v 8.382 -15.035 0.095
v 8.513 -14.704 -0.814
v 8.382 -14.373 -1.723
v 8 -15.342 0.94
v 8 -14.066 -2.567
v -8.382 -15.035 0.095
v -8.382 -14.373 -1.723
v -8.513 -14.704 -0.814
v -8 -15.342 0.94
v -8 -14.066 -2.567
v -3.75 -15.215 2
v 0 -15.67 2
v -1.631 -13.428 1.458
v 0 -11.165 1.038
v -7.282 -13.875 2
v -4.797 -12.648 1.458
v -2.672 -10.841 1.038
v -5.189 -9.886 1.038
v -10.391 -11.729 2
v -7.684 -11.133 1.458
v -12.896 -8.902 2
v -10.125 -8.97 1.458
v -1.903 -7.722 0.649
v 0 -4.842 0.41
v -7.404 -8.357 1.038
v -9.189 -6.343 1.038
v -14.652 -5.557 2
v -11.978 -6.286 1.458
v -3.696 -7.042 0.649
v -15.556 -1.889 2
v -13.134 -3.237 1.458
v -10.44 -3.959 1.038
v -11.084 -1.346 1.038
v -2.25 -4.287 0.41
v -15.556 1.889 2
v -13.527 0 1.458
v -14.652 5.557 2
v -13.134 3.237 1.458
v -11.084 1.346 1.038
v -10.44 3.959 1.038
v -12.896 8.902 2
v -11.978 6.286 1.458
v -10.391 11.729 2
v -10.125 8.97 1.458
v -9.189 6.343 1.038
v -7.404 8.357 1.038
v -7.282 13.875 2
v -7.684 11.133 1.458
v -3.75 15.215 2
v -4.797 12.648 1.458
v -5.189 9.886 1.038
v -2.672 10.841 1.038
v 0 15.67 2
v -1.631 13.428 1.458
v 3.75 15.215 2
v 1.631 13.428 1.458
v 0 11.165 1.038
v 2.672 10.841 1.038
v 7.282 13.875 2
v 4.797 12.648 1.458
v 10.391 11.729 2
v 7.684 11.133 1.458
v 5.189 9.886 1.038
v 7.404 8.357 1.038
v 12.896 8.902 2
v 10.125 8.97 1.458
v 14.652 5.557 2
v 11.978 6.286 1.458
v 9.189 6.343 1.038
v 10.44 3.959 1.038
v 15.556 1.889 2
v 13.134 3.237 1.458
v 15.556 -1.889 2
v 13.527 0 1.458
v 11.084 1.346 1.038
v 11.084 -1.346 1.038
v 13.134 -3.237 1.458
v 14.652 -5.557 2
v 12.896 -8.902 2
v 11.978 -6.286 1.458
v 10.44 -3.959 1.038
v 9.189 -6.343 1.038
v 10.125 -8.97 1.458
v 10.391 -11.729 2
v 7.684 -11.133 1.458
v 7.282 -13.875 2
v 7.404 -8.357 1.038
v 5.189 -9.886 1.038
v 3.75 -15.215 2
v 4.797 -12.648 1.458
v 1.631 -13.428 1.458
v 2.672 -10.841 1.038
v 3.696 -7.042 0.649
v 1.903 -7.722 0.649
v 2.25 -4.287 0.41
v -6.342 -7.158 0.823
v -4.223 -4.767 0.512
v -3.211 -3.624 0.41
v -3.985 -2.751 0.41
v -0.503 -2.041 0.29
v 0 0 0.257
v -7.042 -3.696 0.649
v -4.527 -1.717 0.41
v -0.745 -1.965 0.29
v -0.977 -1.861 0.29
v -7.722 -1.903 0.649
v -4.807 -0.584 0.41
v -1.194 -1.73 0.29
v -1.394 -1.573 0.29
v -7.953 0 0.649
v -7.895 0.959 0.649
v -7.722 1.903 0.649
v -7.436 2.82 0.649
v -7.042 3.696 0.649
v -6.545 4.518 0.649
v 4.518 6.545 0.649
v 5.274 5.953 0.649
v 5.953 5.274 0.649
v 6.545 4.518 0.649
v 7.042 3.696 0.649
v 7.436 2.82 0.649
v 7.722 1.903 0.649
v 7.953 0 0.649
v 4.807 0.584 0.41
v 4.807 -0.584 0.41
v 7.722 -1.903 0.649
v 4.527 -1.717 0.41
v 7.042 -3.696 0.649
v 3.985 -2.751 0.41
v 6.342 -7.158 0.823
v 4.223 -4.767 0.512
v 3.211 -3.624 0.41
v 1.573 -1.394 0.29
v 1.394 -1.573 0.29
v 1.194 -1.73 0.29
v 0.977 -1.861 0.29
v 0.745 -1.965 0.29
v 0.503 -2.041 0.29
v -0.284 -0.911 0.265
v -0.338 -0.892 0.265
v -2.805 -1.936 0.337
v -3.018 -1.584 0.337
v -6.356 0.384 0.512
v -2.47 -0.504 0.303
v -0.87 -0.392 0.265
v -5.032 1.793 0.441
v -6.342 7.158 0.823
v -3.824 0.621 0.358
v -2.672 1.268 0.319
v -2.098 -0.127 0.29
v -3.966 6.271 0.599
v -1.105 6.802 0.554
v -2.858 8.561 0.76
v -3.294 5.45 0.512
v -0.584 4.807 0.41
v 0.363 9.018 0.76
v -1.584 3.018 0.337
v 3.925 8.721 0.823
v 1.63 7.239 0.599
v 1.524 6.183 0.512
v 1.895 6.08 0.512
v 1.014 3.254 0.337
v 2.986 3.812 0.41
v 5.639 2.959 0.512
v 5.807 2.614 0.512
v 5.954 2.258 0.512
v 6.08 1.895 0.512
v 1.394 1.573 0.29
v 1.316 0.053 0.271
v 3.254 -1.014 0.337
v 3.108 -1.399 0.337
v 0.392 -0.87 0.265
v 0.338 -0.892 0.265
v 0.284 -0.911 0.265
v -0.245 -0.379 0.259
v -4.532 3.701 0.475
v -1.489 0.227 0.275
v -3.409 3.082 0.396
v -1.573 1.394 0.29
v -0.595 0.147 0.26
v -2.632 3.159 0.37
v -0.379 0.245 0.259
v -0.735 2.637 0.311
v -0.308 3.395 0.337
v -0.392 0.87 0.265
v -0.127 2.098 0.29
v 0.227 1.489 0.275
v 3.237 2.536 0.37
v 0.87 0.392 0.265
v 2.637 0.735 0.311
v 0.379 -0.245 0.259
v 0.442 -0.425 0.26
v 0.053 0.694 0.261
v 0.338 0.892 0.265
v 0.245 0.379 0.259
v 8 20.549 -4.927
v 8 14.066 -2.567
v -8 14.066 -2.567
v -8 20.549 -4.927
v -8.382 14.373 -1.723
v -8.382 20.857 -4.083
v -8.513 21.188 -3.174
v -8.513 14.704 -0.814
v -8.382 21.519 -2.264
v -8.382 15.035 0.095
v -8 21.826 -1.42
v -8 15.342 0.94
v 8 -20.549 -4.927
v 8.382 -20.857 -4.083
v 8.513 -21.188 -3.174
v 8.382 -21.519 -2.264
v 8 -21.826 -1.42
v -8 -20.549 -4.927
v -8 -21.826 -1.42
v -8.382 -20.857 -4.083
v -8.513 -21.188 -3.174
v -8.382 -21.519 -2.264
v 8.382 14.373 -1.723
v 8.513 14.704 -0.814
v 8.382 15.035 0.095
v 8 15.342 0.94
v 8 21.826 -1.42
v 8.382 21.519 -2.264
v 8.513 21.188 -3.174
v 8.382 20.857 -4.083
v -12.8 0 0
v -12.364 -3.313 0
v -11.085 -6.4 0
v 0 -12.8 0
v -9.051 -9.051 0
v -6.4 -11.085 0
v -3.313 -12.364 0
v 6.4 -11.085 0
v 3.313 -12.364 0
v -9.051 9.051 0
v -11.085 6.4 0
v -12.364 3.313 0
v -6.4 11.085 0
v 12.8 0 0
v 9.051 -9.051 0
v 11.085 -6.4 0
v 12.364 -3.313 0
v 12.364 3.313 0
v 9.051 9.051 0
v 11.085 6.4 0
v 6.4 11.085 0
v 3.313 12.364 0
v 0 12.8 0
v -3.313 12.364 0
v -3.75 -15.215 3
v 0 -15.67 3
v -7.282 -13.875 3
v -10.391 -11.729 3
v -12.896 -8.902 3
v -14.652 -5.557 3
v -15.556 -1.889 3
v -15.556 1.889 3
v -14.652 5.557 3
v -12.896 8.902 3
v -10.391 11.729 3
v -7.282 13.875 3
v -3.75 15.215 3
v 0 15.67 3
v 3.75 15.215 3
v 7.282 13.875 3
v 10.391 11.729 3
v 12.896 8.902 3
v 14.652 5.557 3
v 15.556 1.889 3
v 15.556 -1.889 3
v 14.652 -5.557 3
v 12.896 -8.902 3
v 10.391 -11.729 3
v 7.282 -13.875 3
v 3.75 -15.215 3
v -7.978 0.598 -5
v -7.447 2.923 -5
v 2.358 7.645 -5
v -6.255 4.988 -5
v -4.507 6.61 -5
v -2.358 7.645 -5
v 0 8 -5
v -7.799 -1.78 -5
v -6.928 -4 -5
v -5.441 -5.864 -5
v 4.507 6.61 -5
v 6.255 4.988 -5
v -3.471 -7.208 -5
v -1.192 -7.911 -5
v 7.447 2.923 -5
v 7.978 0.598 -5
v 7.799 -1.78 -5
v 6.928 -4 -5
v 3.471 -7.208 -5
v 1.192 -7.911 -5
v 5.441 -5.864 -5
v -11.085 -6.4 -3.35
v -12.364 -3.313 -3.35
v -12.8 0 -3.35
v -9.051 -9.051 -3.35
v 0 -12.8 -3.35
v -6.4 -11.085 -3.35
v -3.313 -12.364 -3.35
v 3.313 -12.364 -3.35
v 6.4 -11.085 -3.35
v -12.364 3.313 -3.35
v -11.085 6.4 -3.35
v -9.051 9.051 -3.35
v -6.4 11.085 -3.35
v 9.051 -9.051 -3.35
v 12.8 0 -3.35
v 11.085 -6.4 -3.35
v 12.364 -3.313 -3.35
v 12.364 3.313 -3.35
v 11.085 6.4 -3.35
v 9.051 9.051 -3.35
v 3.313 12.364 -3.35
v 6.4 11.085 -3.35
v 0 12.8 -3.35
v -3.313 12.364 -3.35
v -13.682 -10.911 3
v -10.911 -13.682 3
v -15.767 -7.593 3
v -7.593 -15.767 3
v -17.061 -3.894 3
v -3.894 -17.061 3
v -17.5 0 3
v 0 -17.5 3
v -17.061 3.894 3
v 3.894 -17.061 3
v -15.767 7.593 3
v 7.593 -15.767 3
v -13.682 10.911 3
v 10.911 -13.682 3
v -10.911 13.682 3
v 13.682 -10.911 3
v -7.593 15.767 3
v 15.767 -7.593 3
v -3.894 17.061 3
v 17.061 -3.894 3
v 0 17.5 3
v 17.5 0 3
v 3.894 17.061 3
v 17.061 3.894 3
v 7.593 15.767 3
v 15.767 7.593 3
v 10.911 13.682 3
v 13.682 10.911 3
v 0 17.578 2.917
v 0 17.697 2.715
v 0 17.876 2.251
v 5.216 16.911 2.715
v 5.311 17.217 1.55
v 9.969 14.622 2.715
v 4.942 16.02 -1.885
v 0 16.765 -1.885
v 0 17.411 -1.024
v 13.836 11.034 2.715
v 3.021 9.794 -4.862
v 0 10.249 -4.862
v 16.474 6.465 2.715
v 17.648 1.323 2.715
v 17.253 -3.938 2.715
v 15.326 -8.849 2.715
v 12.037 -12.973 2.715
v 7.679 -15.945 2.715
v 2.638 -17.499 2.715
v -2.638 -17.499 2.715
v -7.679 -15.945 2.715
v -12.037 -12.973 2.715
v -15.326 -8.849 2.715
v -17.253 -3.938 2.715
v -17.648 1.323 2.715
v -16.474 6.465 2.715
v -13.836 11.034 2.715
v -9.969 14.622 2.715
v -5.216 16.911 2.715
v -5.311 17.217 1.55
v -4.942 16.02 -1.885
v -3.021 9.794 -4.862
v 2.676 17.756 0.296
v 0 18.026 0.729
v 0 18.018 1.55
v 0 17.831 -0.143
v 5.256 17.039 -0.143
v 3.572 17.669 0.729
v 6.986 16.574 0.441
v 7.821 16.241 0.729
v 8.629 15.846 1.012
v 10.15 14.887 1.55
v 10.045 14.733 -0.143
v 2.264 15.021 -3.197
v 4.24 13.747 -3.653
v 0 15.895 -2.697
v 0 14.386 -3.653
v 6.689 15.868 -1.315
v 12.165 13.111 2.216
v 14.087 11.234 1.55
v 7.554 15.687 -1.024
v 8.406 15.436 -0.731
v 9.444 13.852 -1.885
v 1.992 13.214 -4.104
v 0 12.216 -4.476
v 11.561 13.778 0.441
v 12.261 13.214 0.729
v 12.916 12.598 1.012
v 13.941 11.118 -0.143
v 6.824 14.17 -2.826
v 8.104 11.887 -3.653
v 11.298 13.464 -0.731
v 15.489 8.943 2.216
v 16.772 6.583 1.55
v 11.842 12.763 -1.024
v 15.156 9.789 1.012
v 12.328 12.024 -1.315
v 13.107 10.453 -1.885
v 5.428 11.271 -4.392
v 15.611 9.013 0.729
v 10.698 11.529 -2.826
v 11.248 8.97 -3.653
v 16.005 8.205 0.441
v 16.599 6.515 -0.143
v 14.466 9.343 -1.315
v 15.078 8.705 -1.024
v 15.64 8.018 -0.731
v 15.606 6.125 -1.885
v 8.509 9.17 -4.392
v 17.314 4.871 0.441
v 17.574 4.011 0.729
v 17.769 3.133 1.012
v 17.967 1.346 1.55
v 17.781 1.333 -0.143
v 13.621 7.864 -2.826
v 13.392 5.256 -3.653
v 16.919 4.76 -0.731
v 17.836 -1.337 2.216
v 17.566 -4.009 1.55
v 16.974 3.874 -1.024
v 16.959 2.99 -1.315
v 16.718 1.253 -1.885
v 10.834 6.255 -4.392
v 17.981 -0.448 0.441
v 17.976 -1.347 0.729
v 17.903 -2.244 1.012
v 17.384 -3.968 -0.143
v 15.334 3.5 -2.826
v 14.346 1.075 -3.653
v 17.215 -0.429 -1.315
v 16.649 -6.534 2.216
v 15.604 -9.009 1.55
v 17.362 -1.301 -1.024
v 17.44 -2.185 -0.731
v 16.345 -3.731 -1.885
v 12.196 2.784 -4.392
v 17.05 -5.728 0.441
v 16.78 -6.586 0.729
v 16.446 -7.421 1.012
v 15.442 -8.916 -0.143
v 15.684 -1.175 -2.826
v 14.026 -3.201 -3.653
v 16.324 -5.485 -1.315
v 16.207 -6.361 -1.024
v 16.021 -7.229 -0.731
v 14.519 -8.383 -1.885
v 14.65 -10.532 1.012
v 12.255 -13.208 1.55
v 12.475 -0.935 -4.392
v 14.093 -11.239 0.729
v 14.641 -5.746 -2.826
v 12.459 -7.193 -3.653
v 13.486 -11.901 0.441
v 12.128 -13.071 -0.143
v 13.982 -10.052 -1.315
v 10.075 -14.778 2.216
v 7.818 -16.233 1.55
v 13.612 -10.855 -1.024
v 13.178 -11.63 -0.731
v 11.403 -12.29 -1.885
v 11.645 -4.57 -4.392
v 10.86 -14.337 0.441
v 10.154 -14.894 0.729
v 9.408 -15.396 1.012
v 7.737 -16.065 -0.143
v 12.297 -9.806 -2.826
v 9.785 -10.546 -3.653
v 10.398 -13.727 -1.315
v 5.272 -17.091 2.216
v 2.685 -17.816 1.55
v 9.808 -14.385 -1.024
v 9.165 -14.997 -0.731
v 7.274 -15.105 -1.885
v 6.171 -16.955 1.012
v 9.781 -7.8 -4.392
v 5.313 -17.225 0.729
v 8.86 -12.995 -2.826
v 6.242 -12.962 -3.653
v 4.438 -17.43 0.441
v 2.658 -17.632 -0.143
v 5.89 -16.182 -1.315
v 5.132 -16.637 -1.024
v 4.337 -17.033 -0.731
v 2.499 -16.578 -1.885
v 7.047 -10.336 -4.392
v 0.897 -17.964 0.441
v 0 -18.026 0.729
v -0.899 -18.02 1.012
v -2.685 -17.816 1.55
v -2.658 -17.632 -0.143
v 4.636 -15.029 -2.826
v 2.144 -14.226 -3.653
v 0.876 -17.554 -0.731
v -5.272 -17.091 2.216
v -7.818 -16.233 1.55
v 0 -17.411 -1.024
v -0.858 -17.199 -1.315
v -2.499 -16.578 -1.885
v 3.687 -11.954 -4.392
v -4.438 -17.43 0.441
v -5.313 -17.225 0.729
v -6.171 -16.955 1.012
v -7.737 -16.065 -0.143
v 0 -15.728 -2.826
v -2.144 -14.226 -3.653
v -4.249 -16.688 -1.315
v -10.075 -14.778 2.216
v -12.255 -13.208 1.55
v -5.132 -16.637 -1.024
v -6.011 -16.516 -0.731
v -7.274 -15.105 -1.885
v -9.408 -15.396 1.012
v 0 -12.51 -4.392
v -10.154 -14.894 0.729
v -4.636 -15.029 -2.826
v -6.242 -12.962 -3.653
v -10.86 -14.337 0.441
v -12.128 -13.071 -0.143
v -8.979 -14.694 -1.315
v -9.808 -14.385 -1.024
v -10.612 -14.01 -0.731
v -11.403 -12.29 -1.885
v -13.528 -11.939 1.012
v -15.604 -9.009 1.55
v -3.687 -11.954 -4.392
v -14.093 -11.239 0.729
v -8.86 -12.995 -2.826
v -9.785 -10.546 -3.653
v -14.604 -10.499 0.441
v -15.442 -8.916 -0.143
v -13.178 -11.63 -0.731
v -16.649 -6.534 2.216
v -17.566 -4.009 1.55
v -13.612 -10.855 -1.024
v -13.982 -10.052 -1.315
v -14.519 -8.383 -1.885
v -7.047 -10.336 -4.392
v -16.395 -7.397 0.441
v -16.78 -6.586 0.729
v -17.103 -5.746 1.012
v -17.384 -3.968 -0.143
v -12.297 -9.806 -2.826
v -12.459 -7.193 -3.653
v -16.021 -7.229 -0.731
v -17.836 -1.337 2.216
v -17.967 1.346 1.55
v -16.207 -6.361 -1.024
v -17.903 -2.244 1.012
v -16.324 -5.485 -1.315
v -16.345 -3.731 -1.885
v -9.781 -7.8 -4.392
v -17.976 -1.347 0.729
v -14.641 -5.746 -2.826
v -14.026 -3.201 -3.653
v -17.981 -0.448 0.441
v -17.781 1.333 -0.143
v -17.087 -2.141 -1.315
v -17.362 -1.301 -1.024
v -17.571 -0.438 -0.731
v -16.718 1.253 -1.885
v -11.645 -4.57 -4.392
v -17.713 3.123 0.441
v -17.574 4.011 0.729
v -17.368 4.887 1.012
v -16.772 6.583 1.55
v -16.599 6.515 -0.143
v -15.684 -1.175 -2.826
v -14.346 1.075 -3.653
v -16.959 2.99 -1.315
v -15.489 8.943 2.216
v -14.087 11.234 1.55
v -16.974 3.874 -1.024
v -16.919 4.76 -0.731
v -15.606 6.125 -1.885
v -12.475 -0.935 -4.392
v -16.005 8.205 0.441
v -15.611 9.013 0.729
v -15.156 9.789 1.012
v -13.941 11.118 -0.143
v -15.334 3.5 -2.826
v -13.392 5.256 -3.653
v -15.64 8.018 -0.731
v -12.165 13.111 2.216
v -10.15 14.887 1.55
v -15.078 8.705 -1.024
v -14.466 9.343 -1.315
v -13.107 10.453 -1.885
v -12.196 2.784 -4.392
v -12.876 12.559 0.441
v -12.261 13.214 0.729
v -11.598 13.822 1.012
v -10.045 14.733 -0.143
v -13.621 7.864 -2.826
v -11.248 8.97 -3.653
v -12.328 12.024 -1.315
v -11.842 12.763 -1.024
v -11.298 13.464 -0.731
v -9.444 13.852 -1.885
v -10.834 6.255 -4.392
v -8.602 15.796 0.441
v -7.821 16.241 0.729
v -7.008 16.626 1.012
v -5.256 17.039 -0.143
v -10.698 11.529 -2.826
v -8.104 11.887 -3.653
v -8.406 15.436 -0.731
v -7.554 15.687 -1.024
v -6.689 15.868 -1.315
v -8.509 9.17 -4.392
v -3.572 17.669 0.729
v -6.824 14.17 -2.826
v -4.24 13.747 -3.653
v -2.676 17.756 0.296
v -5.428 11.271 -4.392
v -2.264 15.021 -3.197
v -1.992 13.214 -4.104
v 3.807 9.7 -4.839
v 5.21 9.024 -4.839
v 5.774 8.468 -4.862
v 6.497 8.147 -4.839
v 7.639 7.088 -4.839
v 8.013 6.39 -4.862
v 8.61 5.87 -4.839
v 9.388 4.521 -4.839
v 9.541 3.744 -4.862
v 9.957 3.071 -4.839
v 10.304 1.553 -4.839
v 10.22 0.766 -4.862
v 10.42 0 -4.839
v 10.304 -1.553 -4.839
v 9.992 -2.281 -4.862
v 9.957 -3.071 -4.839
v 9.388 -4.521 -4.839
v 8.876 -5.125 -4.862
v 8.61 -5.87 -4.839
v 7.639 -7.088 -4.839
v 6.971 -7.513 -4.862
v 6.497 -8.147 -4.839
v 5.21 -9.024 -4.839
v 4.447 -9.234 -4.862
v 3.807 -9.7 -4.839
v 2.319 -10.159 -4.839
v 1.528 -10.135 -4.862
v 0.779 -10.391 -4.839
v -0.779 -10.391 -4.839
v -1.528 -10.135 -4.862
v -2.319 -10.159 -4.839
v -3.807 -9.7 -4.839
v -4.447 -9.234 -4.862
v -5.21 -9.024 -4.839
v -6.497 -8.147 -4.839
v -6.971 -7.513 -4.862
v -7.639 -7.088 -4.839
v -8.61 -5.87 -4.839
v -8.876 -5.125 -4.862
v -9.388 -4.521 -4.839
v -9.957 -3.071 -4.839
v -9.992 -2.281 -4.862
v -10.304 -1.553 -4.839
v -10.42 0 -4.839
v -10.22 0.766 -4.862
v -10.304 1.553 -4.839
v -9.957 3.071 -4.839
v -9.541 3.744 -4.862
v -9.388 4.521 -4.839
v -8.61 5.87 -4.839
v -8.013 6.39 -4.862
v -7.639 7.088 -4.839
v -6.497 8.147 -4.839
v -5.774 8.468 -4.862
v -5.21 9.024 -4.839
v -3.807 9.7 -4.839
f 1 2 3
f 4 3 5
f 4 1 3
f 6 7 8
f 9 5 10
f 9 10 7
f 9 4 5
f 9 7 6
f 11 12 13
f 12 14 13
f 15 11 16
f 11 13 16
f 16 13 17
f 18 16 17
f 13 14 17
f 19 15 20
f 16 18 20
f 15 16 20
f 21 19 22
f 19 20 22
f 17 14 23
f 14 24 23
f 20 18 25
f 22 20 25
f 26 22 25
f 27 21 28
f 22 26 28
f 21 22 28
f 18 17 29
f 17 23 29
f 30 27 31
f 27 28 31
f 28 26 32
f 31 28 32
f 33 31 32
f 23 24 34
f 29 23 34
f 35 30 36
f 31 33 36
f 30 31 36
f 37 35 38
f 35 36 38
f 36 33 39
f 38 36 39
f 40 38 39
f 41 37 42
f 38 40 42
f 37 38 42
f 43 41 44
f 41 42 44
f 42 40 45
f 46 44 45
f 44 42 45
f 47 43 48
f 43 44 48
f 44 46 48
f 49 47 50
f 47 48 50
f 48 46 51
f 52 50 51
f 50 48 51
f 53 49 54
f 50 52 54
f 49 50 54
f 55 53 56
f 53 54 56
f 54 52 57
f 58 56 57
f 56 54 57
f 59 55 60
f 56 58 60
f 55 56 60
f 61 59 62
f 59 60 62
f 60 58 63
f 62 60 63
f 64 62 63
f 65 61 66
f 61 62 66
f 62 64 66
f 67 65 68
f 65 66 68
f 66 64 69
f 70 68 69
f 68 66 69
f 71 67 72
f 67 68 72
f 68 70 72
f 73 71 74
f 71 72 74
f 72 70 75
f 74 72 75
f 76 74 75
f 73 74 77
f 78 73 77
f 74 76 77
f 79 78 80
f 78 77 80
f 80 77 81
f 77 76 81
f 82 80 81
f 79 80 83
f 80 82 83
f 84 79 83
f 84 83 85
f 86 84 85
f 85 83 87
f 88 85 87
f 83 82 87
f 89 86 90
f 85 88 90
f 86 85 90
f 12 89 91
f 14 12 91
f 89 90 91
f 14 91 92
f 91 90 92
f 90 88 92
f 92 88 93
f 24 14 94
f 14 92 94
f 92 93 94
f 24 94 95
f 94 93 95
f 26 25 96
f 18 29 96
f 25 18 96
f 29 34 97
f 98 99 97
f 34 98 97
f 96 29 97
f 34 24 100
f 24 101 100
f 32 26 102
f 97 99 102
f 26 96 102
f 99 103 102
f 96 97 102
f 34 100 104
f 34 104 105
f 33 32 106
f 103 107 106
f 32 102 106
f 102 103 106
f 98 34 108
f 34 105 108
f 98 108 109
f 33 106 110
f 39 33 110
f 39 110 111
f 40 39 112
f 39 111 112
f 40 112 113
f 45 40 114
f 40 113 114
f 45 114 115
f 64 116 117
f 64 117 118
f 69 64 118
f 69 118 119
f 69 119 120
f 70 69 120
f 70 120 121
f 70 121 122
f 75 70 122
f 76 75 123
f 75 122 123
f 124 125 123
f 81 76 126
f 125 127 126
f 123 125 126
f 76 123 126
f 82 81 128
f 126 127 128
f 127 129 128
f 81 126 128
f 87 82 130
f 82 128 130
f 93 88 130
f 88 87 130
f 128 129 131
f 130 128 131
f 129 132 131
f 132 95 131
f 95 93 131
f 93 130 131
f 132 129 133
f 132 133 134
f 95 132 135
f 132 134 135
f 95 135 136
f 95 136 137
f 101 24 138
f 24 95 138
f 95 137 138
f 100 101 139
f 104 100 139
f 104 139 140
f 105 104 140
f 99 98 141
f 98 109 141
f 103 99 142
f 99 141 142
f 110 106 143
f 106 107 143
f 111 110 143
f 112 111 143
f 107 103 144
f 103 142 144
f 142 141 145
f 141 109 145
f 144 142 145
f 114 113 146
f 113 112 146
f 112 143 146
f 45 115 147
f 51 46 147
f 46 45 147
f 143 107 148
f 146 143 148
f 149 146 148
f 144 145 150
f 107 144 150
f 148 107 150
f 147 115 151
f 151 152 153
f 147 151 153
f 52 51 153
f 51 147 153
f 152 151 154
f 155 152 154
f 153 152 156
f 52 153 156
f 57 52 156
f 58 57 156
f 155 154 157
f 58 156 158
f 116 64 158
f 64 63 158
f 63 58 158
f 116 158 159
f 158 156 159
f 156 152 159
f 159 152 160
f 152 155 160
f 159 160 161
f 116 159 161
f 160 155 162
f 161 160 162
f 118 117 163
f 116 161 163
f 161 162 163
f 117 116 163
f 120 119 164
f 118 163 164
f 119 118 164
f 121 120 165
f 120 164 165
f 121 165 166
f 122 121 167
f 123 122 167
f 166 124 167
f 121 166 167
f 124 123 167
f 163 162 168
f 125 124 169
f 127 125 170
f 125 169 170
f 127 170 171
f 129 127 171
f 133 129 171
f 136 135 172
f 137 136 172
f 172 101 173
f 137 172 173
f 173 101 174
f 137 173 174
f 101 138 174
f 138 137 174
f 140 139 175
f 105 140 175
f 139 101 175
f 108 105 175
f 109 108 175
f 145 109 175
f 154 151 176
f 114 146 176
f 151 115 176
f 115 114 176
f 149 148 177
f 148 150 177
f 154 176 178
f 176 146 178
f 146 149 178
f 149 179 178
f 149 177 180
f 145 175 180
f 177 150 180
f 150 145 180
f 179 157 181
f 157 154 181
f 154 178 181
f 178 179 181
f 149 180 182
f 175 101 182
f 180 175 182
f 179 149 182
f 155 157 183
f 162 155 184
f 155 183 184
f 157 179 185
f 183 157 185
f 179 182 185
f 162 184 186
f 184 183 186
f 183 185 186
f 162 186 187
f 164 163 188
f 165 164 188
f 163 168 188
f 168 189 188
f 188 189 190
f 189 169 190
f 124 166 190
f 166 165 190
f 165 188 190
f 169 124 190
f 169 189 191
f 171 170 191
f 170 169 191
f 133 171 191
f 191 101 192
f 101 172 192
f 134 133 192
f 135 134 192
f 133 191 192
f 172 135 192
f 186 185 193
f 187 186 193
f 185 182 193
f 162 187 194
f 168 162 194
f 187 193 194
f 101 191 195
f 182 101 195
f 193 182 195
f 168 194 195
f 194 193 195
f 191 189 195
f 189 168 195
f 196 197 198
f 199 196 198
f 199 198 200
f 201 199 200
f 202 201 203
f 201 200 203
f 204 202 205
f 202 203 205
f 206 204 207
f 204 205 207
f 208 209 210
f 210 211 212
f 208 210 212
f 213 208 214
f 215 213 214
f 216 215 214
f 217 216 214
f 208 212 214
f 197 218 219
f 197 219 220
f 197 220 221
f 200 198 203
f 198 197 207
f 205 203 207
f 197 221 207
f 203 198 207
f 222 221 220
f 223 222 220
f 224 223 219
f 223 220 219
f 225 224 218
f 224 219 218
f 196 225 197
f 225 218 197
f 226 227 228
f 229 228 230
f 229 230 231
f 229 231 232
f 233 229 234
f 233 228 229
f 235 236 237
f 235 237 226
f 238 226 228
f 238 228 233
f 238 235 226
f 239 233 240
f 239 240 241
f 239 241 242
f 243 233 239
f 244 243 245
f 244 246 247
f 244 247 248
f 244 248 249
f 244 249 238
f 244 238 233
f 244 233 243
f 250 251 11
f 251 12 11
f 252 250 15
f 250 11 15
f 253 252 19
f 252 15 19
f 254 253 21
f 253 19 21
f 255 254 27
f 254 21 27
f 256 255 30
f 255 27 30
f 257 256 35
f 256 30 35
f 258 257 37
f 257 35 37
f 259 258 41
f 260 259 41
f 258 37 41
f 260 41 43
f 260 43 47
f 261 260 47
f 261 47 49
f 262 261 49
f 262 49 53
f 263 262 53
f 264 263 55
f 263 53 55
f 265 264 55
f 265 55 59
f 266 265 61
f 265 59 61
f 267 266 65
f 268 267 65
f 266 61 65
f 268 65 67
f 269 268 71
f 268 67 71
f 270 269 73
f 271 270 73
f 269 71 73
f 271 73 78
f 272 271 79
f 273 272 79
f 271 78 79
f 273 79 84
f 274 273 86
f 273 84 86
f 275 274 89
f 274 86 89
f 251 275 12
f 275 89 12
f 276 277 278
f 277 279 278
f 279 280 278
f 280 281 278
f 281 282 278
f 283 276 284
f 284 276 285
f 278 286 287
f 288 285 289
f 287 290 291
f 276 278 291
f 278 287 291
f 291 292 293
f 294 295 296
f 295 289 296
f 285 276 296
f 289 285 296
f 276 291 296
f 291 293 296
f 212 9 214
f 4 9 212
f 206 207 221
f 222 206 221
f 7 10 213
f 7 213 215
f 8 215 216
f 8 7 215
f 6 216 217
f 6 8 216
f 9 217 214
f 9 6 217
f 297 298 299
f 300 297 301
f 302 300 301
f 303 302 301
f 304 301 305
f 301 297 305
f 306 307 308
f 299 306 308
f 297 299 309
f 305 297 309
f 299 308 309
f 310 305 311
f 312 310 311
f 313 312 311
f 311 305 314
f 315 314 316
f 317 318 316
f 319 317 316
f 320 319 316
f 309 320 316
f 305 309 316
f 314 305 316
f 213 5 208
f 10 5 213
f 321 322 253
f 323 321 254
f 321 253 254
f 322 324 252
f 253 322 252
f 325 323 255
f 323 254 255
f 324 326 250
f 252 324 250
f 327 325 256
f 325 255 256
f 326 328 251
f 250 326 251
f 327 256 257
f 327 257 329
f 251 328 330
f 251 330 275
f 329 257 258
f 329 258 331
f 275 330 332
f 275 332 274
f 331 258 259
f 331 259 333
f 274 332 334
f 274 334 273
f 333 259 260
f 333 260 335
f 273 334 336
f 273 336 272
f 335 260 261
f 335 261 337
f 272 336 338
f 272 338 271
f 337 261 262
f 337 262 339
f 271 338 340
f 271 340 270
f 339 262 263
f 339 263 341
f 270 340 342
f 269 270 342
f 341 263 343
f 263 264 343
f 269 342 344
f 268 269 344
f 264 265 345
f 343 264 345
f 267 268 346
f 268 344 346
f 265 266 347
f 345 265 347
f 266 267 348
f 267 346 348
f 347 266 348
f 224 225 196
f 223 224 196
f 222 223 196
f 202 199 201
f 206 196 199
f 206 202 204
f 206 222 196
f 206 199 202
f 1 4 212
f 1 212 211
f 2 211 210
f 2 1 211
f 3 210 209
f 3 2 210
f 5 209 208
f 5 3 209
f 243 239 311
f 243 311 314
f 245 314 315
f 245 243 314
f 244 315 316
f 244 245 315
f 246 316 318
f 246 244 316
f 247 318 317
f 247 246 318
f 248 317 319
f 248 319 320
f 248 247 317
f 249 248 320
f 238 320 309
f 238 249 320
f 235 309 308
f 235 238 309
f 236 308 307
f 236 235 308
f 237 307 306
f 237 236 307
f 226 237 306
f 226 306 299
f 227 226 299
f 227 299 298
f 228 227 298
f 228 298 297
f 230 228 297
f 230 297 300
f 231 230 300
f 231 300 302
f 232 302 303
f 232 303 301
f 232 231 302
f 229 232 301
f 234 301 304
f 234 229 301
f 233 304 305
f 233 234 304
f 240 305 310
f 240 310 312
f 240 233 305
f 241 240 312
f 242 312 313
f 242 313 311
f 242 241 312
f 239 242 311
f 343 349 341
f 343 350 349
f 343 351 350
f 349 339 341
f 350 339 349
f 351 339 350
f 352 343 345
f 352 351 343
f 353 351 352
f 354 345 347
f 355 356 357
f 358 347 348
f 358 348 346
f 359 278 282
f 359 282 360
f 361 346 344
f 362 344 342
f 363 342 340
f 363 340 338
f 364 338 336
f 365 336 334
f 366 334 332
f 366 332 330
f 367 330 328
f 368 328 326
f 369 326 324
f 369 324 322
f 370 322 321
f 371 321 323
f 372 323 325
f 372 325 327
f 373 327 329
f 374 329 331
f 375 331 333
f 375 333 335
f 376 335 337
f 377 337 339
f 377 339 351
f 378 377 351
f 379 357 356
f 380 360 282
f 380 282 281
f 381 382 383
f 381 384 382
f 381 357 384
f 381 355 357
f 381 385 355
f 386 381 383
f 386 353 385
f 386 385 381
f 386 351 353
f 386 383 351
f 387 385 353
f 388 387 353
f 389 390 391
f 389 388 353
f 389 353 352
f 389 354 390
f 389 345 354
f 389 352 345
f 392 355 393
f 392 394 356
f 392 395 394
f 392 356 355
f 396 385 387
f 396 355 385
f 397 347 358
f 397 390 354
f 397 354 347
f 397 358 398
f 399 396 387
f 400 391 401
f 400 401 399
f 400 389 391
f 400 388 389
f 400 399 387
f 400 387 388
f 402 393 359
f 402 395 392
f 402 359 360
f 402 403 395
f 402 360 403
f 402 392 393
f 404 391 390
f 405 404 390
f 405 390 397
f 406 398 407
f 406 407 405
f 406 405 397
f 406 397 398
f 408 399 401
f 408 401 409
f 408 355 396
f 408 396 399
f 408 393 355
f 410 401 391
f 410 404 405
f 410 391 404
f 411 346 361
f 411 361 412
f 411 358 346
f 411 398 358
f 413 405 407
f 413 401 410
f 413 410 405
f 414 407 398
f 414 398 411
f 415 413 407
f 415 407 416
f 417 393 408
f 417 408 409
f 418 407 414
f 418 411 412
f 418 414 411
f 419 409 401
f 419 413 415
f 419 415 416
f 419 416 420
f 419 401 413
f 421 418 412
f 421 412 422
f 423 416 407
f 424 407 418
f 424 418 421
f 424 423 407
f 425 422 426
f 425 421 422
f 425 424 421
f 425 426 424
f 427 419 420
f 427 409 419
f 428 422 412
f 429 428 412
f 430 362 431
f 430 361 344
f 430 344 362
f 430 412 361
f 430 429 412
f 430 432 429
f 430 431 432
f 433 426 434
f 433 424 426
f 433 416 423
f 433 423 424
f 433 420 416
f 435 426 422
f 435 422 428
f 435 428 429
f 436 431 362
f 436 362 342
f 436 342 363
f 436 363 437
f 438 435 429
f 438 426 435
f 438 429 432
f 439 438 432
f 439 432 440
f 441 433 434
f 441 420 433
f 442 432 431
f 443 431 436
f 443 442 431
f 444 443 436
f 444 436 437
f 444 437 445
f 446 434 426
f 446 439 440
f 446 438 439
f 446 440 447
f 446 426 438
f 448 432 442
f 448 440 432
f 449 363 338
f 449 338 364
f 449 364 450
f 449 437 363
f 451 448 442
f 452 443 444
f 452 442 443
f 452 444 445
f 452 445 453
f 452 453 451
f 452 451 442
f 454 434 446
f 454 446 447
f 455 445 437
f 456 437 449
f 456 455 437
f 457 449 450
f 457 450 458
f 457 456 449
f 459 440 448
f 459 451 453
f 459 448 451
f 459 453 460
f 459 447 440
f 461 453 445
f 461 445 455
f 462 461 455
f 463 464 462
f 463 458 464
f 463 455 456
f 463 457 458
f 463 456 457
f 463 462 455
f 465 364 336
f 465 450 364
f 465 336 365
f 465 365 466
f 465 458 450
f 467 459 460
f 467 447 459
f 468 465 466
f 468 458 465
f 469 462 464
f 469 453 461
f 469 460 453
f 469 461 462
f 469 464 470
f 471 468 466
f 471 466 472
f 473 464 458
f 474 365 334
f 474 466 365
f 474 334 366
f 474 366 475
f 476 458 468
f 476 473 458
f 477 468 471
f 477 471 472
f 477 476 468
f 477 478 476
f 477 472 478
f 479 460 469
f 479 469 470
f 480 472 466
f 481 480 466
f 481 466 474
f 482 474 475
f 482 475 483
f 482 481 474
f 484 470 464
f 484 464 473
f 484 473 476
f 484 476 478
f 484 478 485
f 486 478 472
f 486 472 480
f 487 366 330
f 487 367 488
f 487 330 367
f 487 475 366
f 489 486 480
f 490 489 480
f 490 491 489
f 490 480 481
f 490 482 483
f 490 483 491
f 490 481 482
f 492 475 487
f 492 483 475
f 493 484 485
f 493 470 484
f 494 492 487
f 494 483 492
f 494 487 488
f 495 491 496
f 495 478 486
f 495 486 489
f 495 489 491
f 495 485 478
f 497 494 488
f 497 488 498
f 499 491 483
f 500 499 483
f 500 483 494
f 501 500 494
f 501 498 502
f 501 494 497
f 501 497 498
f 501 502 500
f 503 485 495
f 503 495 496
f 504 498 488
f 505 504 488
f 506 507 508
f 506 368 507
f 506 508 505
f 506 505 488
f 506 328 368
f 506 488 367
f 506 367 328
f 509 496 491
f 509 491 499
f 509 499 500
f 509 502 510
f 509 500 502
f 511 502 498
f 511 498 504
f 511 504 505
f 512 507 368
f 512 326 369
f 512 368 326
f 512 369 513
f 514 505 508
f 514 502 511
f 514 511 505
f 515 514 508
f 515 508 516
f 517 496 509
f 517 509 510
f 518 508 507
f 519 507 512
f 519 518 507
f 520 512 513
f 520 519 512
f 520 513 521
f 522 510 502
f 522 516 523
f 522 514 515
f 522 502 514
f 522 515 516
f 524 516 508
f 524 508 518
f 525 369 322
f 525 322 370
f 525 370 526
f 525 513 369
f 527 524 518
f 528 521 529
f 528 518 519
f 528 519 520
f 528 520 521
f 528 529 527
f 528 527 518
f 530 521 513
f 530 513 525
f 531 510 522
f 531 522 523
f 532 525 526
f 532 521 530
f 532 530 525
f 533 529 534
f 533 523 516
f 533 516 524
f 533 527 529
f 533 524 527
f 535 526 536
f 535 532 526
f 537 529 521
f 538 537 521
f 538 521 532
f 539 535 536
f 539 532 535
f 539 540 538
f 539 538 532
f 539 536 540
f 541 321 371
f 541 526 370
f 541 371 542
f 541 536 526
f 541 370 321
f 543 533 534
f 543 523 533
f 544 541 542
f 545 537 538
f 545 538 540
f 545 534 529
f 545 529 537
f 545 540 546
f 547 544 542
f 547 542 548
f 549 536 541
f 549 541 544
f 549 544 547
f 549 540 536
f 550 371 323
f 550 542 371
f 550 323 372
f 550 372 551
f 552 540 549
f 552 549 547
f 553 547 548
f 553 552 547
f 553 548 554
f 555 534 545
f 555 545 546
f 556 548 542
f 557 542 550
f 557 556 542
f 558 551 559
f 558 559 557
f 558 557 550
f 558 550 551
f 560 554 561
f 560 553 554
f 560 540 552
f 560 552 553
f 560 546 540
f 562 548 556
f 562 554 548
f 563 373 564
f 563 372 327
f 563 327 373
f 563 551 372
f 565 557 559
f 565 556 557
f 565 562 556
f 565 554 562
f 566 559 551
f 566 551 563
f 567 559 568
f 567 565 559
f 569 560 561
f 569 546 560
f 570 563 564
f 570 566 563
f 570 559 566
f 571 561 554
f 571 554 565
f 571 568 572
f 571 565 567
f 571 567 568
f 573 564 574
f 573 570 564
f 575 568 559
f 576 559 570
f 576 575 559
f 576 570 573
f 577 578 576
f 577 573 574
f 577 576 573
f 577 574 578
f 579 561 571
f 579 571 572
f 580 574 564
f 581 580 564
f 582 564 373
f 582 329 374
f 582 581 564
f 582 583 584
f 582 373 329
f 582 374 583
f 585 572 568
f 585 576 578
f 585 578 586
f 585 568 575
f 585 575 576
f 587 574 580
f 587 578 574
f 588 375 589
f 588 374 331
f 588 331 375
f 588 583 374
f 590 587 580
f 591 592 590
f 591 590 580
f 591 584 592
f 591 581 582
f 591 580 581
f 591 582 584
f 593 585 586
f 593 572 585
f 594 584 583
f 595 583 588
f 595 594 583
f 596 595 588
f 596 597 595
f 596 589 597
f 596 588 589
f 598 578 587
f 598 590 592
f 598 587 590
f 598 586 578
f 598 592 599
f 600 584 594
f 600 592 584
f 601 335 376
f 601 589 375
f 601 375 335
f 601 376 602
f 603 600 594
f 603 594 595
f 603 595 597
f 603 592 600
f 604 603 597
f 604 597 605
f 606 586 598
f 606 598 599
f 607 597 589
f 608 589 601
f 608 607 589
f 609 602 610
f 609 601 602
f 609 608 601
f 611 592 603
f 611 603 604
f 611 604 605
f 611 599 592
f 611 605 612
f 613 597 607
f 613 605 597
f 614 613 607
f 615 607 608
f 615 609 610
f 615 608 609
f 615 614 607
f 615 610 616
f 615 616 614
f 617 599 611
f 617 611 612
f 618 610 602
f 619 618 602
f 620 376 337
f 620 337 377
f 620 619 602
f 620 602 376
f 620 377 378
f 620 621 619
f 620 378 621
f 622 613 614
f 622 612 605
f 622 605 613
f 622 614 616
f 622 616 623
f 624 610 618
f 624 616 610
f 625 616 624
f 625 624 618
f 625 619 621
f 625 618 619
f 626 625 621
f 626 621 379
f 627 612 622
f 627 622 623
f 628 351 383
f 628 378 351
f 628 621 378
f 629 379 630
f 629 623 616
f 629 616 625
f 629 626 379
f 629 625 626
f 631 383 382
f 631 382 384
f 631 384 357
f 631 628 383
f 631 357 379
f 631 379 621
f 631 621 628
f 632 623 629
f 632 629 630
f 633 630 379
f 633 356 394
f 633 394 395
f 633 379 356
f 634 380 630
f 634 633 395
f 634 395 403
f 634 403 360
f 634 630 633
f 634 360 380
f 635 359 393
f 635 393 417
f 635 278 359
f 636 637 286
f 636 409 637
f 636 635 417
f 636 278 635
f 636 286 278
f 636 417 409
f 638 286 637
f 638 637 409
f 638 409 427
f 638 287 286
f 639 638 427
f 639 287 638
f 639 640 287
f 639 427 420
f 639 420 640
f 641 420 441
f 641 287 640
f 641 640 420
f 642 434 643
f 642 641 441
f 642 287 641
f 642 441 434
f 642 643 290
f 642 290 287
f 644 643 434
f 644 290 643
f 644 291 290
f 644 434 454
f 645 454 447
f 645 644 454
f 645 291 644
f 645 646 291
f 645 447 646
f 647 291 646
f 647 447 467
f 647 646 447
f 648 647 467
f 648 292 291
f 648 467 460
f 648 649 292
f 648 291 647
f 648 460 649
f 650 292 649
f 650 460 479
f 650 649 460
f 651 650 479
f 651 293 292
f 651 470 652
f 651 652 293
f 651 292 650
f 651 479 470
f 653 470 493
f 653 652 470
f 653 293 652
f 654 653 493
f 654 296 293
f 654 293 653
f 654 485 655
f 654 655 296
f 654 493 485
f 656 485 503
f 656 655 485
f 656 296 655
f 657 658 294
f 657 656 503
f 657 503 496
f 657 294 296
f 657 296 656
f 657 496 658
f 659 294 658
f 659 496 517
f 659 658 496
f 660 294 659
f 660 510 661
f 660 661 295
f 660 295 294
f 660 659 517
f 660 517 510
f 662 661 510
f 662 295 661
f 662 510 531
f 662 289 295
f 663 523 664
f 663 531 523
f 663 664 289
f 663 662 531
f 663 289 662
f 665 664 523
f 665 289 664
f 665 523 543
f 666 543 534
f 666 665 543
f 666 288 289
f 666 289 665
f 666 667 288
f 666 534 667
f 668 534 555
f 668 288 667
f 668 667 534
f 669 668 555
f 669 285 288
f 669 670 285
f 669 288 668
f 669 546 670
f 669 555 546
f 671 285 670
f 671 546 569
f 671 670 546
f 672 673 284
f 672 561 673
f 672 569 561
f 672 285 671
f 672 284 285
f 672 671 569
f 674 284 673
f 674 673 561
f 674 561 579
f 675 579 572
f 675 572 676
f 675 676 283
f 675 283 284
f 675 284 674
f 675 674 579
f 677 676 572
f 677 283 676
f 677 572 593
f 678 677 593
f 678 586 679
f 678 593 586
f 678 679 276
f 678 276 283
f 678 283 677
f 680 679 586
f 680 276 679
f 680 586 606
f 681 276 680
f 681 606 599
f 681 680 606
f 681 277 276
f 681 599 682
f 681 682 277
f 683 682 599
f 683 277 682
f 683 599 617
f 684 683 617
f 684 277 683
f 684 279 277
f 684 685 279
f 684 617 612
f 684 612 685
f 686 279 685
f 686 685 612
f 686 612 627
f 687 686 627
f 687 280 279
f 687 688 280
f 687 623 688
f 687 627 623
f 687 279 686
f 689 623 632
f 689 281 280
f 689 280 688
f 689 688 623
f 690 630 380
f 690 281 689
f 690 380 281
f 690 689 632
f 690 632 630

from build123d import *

# Parameters (mm, degrees)
F0_R     = 12.8
F1_DEPTH = 3.35
F9_DEPTH = 6.9


with BuildPart() as f1:
    # F0 (on Top) → F1 (new body)
    with BuildSketch(Plane.XY):
        Circle(F0_R)
    extrude(amount=-F1_DEPTH)


with BuildPart() as f3:
    # F2 (on Right) → F3 (revolve)
    with BuildSketch(Plane.YZ):
        with BuildLine():
            Line((17.5, 3), (0, 3))
            Line((0, 3), (0, -5))
            Line((0, -5), (8, -5))
            add(Edge.make_bspline(
                [(17.5, 3), (17.7214574069, 2.8375657275), (19.1802630622, -0.6381570551), (14.2400054109, -5), (8, -5)],
                knots=[0, 0, 0, 0, 0.3198546501, 1, 1, 1, 1], degree=3))
        make_face()
    revolve(axis=Axis((0, 0, -1.7860705041), (0, 0, -1)))

    # F4 (on Right) → F5 (revolve, cut)
    with BuildSketch(Plane.YZ):
        with BuildLine():
            Line((0, 3), (-15.6701598316, 3))
            Line((-15.6701598316, 3), (-15.6701598316, 2))
            add(Edge.make_bspline(
                [(-15.6701598316, 2), (-10.8706988394, 0.5381689805), (-3.1210567393, 0.2571985931), (0, 0.2571985931)],
                knots=[0, 0, 0, 0, 15.766777283, 15.766777283, 15.766777283, 15.766777283], degree=3))
            Line((0, 0.2571985931), (0, 3))
        make_face()
    revolve(axis=Axis((0, 0, -2.2828420624), (0, 0, -1)), mode=Mode.SUBTRACT)


with BuildPart() as f9:
    # F8 (on line) → F9 (new body)
    with BuildSketch(Plane(origin=(0, 13.2453333234, -4.8209070726), x_dir=(-1, 0, 0), z_dir=(0, 0.9396926208, -0.3420201433))):
        with BuildLine():
            Line((8, 6.1303021499), (0, 6.1303021499))
            Line((0, 6.1303021499), (-8, 6.1303021499))
            ThreePointArc((-8, 6.1303021499), (-8.5127570453, 4.2642791889), (-8, 2.3982562279))
            Line((-8, 2.3982562279), (0, 2.3982562279))
            Line((0, 2.3982562279), (8, 2.3982562279))
            ThreePointArc((8, 2.3982562279), (8.5127570453, 4.2642791889), (8, 6.1303021499))
        make_face()
    extrude(amount=F9_DEPTH)


with BuildPart() as f10_1:
    # F10: instance of F9
    add(f9.part.mirror(Plane.XZ))


solid = Compound([f1.part, f3.part, f9.part, f10_1.part])
